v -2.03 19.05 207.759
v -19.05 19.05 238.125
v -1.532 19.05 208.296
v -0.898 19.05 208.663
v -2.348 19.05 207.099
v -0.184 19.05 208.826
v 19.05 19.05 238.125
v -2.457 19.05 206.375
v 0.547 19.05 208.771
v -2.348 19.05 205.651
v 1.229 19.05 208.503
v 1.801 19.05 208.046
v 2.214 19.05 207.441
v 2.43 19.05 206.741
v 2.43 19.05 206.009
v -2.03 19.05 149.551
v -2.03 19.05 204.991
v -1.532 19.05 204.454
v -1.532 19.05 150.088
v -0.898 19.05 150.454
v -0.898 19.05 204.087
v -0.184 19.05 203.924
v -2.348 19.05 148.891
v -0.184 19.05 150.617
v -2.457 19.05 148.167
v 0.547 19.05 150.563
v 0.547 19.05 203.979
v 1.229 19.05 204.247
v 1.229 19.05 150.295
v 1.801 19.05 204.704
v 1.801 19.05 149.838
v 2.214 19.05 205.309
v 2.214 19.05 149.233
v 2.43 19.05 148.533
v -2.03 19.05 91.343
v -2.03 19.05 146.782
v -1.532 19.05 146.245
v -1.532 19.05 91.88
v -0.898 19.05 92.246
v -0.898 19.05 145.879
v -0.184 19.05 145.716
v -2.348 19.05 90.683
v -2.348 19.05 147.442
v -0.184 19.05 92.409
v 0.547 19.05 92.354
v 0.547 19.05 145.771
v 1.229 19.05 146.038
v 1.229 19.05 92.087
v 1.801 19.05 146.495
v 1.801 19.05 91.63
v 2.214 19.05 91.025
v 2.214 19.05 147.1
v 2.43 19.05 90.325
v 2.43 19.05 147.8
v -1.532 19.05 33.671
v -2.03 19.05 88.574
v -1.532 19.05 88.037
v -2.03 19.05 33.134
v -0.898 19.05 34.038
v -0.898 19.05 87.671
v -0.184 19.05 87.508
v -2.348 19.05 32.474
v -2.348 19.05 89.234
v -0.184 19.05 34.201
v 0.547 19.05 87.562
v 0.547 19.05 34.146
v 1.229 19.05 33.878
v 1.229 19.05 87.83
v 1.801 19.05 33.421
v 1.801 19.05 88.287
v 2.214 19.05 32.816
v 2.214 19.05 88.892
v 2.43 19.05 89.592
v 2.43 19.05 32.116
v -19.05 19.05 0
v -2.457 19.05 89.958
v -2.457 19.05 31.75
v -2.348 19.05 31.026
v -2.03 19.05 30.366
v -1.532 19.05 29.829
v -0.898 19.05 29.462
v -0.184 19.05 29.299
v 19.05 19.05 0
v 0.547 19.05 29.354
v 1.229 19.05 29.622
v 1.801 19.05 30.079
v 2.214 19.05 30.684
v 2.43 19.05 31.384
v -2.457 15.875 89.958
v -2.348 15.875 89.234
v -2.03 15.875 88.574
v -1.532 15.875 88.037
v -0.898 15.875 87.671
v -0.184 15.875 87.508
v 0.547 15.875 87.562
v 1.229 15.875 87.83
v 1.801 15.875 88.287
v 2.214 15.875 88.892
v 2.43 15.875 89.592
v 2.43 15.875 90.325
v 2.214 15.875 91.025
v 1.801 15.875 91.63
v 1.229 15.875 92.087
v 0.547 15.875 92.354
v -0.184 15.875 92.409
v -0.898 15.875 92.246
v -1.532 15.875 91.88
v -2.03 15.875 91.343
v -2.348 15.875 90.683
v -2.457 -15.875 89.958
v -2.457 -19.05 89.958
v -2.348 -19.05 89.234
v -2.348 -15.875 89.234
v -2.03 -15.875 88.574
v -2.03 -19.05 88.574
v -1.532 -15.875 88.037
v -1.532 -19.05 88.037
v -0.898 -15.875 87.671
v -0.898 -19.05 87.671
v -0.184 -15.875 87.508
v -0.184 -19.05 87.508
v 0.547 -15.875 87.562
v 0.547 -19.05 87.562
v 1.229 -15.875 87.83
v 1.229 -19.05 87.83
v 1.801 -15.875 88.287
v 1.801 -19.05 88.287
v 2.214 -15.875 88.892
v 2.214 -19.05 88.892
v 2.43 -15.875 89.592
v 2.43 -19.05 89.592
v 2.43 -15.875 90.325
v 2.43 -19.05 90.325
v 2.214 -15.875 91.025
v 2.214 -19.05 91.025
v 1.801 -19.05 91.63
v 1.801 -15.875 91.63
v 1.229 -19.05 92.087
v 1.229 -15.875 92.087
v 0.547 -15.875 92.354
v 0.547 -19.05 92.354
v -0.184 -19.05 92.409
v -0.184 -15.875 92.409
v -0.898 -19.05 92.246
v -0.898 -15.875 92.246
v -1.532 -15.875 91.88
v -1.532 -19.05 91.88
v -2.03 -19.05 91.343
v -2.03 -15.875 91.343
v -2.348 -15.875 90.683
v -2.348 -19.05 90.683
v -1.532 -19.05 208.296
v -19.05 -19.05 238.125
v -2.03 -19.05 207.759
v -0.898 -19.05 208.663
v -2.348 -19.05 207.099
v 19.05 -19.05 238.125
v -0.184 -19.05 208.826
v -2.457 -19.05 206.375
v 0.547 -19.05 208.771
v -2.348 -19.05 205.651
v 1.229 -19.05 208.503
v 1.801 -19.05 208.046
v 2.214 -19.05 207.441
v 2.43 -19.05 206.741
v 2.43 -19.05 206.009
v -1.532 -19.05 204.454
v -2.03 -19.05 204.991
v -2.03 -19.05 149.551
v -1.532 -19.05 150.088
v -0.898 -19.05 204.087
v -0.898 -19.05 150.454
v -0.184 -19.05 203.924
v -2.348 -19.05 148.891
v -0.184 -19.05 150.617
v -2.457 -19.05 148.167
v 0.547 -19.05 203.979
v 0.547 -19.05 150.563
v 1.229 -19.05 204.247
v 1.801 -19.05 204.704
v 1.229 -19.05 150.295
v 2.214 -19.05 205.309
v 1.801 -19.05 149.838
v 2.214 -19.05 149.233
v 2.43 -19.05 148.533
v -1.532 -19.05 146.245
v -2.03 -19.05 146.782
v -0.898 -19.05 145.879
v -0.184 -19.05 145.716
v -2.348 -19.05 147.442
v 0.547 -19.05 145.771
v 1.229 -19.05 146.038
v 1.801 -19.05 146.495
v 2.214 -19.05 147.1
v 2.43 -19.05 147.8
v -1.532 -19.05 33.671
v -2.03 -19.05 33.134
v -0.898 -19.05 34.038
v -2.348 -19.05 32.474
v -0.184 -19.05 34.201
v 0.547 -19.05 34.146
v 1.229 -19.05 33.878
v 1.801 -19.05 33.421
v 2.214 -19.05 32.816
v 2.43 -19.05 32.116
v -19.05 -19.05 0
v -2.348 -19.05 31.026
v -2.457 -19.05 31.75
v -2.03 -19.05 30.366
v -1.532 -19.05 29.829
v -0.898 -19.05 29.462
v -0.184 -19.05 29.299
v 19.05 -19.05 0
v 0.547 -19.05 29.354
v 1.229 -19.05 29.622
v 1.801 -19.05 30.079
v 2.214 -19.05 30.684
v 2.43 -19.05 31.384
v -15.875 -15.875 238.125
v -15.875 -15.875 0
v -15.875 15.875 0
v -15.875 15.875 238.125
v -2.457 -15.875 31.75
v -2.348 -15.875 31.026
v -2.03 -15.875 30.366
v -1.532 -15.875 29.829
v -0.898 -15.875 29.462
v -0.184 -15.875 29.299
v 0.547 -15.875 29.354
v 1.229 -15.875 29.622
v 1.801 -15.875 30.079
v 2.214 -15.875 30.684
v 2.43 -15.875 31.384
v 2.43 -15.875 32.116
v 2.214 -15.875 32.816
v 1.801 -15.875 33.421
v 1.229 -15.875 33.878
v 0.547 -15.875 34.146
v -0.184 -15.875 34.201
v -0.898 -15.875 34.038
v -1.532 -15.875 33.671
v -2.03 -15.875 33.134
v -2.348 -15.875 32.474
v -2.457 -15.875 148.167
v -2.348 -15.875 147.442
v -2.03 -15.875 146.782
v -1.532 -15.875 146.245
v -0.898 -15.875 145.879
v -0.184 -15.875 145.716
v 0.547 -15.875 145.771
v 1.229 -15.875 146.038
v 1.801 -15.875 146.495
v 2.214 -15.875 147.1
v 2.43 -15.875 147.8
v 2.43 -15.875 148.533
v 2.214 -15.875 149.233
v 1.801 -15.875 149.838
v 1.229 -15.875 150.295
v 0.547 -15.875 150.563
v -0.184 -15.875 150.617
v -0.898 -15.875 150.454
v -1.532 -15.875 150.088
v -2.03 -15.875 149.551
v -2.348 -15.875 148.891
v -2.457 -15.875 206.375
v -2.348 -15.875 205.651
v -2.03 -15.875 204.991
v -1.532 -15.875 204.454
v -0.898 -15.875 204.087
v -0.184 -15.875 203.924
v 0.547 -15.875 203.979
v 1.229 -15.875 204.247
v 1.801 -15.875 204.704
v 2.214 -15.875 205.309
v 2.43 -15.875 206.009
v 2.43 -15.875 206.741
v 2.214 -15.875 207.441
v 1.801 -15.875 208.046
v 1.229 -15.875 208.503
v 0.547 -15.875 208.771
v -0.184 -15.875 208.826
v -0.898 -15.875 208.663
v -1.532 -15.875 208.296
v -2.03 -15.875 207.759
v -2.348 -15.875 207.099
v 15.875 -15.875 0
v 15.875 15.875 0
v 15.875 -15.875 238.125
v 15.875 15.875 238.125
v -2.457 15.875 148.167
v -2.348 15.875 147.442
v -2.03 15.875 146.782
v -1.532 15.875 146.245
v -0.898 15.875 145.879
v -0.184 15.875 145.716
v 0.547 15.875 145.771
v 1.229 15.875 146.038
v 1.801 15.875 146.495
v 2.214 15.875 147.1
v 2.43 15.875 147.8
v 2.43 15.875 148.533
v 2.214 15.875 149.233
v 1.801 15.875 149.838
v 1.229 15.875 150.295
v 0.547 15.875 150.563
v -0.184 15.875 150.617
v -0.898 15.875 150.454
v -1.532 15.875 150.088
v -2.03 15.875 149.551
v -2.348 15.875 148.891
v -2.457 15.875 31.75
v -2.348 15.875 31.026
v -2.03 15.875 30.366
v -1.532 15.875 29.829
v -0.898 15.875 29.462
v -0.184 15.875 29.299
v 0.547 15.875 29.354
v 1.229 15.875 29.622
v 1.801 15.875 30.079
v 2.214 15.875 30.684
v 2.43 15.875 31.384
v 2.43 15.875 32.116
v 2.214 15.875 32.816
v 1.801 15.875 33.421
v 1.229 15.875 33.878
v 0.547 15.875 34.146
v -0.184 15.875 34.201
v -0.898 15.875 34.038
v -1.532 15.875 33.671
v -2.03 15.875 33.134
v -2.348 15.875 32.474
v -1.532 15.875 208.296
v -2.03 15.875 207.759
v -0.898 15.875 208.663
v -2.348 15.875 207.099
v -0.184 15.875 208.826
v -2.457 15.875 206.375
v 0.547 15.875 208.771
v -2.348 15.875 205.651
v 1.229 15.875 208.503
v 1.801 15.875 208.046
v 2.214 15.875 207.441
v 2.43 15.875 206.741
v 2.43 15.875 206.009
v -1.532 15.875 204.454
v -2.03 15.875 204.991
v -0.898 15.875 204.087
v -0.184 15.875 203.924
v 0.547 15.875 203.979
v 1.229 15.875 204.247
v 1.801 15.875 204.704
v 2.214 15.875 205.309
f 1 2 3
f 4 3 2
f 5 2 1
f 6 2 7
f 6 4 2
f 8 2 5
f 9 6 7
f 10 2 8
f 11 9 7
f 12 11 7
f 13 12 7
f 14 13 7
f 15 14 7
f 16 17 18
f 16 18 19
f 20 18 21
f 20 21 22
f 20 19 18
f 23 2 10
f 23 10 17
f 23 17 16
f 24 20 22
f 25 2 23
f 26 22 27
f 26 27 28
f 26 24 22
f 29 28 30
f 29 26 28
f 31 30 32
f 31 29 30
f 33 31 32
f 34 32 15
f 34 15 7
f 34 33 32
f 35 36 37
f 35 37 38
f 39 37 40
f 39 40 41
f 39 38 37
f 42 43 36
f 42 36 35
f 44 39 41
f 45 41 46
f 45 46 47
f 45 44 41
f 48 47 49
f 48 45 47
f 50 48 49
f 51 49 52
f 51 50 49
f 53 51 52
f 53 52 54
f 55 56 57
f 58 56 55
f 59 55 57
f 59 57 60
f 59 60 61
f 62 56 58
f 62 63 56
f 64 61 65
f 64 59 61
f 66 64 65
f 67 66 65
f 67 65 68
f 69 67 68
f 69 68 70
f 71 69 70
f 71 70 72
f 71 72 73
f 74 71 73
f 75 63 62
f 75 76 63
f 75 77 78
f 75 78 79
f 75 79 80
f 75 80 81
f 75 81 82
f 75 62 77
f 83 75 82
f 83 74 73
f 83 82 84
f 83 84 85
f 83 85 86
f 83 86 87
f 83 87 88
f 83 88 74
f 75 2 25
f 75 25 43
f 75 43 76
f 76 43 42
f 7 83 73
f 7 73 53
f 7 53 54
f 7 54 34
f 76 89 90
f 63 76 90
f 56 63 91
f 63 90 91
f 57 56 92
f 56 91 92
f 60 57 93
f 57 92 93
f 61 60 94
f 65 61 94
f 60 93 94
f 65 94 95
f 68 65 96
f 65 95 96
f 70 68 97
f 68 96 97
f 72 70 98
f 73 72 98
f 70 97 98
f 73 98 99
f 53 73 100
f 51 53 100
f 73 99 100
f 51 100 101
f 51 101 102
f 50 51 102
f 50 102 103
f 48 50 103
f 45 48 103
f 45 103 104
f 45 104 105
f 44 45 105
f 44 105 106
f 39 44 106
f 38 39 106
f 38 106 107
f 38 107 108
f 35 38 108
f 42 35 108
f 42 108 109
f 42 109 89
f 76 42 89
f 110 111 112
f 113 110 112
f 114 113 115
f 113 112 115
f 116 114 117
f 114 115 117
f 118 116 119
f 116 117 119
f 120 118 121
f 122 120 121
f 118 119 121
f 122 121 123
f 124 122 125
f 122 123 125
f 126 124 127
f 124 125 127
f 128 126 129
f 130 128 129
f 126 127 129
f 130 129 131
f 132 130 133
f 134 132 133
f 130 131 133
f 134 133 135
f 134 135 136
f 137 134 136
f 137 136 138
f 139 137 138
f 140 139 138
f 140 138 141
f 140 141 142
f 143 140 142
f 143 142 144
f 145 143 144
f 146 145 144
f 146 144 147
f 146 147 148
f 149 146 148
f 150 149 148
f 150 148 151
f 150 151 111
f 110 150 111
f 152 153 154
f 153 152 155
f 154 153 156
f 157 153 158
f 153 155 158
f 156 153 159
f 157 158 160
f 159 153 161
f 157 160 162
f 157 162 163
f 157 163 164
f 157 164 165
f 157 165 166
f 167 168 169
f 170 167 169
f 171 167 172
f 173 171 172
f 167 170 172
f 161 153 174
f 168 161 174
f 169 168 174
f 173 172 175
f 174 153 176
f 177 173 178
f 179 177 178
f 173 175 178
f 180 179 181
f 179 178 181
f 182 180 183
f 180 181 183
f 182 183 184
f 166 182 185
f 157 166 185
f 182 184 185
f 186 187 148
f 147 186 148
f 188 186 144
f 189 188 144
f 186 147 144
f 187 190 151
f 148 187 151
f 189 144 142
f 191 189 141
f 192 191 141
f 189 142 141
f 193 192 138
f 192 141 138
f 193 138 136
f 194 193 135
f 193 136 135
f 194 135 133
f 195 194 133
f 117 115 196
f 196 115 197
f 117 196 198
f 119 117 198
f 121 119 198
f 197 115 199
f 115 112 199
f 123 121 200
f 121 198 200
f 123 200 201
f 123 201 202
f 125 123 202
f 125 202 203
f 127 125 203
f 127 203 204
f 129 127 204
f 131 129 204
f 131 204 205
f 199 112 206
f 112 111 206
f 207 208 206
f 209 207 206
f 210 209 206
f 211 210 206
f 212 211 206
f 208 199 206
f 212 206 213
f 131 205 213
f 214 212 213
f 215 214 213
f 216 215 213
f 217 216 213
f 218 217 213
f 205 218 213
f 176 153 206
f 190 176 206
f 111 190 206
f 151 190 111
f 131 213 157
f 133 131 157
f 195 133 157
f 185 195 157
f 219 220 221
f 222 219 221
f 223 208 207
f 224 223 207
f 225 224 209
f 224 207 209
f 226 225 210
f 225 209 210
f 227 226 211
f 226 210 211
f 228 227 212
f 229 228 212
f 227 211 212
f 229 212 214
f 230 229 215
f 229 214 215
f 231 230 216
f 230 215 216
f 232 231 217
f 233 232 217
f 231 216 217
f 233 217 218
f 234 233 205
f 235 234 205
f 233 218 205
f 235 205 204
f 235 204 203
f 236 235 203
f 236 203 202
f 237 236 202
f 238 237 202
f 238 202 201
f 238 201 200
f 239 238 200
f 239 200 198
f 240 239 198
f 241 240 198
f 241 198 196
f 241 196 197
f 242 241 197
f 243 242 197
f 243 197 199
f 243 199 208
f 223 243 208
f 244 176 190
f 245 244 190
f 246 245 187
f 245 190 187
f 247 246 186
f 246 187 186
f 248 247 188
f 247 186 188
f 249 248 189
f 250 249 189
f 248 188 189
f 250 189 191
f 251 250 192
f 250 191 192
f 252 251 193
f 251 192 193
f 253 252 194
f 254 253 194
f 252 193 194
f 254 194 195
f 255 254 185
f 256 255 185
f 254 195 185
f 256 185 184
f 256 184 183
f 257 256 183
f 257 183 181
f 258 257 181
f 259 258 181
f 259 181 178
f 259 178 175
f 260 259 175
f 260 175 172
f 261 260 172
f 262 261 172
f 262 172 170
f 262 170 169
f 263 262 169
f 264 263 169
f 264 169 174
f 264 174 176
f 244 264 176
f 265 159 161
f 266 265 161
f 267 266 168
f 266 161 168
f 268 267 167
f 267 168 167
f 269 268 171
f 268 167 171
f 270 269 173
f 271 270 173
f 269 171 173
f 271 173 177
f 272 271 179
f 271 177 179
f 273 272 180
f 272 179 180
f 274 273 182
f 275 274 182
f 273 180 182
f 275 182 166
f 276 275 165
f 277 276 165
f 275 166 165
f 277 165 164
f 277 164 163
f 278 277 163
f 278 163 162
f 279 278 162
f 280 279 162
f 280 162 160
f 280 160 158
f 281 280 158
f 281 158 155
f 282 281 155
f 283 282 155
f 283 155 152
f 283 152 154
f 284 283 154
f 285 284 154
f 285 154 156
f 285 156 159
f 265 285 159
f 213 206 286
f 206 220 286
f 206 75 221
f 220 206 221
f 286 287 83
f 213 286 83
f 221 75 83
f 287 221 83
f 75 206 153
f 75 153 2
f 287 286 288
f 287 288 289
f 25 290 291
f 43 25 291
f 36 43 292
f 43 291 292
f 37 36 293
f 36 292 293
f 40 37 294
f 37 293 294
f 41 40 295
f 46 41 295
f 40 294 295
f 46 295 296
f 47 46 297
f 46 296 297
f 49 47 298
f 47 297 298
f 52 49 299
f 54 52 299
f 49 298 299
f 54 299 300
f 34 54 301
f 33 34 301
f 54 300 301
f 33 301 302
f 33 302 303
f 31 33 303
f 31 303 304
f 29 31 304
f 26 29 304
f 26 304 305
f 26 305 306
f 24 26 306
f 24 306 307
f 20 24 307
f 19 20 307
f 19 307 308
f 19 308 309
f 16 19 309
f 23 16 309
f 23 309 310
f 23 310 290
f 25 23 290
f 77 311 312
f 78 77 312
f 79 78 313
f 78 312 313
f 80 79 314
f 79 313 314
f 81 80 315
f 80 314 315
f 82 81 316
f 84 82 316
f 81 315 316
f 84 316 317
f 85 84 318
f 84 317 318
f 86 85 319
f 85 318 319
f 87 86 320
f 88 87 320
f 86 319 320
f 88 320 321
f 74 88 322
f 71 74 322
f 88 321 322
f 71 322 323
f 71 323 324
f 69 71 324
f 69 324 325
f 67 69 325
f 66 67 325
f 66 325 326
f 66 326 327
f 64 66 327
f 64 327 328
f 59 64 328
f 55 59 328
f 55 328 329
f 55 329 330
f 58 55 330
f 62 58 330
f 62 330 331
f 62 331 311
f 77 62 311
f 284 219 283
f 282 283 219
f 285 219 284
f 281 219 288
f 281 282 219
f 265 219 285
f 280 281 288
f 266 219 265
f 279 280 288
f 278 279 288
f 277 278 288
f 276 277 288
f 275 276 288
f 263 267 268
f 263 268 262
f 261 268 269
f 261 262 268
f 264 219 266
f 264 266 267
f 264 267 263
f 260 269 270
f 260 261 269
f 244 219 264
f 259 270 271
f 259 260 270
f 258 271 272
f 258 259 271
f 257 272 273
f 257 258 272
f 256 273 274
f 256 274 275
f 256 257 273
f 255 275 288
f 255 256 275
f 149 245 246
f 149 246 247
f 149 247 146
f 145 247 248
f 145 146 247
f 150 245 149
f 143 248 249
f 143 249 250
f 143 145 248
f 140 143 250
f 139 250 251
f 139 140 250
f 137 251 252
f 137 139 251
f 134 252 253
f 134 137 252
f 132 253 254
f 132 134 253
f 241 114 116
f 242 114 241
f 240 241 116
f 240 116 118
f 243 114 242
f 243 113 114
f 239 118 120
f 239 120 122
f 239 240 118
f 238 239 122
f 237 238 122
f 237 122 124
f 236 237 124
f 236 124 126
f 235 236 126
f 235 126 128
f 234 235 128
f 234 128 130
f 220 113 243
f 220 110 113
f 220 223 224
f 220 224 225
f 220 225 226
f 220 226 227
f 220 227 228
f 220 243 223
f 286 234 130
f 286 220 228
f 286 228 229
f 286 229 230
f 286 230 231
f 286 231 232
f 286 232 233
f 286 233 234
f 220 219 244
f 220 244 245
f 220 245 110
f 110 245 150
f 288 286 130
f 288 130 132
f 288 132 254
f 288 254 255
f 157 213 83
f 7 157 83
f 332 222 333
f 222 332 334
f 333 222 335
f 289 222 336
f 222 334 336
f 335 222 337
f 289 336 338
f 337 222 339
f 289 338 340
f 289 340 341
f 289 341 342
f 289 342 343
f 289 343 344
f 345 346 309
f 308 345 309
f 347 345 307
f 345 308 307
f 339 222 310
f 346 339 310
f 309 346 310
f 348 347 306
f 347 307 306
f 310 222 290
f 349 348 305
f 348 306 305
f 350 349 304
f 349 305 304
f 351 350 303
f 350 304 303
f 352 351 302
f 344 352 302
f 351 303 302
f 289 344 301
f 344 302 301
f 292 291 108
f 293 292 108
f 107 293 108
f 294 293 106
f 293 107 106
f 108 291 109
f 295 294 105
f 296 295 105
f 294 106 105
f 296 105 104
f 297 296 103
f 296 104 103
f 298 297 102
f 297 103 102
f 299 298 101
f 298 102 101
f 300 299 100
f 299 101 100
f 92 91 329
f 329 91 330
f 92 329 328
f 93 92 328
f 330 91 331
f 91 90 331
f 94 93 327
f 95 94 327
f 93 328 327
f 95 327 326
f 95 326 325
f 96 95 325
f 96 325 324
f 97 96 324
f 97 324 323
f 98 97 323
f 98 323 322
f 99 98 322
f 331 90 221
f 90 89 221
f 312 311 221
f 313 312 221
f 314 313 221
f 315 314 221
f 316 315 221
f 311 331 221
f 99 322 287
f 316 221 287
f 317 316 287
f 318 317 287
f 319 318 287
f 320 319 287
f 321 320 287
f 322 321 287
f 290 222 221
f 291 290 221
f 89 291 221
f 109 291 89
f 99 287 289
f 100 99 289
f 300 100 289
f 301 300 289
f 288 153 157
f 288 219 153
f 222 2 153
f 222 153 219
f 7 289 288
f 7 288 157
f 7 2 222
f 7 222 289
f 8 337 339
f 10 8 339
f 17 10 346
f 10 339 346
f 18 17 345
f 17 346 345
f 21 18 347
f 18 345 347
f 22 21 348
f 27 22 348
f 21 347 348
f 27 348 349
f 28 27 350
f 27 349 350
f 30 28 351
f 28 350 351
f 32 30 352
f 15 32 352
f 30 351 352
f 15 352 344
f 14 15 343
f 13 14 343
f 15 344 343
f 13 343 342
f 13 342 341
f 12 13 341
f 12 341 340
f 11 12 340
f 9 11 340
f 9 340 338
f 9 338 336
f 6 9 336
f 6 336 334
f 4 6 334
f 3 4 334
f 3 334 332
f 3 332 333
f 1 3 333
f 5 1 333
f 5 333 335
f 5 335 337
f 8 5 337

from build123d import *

# Parameters (mm, degrees)
SKETCH1_W                    = 38.1
SKETCH1_H                    = 38.1
SKETCH1_W_2                  = 31.75
SKETCH1_H_2                  = 31.75
BOSS_EXTRUDE1_DEPTH          = 238.125
F_10_0_1935_DIAMETER_HOLE2_D = 4.9149


with BuildPart() as part:
    # Sketch1 → Boss-Extrude1 (new body)
    with BuildSketch(Plane.XY):
        Rectangle(SKETCH1_W, SKETCH1_H)
        Rectangle(SKETCH1_W_2, SKETCH1_H_2, mode=Mode.SUBTRACT)
    extrude(amount=BOSS_EXTRUDE1_DEPTH)

    # #10 (0.1935) Diameter Hole2 (through all)
    with Locations(Plane(origin=(0, 19.05, 0), x_dir=(1, 0, 0), z_dir=(0, 1, 0))):
        with Locations((0, -31.75), (0, -89.958333333), (0, -148.166666667), (0, -206.375)):
            Hole(F_10_0_1935_DIAMETER_HOLE2_D / 2)


solid = part.part
